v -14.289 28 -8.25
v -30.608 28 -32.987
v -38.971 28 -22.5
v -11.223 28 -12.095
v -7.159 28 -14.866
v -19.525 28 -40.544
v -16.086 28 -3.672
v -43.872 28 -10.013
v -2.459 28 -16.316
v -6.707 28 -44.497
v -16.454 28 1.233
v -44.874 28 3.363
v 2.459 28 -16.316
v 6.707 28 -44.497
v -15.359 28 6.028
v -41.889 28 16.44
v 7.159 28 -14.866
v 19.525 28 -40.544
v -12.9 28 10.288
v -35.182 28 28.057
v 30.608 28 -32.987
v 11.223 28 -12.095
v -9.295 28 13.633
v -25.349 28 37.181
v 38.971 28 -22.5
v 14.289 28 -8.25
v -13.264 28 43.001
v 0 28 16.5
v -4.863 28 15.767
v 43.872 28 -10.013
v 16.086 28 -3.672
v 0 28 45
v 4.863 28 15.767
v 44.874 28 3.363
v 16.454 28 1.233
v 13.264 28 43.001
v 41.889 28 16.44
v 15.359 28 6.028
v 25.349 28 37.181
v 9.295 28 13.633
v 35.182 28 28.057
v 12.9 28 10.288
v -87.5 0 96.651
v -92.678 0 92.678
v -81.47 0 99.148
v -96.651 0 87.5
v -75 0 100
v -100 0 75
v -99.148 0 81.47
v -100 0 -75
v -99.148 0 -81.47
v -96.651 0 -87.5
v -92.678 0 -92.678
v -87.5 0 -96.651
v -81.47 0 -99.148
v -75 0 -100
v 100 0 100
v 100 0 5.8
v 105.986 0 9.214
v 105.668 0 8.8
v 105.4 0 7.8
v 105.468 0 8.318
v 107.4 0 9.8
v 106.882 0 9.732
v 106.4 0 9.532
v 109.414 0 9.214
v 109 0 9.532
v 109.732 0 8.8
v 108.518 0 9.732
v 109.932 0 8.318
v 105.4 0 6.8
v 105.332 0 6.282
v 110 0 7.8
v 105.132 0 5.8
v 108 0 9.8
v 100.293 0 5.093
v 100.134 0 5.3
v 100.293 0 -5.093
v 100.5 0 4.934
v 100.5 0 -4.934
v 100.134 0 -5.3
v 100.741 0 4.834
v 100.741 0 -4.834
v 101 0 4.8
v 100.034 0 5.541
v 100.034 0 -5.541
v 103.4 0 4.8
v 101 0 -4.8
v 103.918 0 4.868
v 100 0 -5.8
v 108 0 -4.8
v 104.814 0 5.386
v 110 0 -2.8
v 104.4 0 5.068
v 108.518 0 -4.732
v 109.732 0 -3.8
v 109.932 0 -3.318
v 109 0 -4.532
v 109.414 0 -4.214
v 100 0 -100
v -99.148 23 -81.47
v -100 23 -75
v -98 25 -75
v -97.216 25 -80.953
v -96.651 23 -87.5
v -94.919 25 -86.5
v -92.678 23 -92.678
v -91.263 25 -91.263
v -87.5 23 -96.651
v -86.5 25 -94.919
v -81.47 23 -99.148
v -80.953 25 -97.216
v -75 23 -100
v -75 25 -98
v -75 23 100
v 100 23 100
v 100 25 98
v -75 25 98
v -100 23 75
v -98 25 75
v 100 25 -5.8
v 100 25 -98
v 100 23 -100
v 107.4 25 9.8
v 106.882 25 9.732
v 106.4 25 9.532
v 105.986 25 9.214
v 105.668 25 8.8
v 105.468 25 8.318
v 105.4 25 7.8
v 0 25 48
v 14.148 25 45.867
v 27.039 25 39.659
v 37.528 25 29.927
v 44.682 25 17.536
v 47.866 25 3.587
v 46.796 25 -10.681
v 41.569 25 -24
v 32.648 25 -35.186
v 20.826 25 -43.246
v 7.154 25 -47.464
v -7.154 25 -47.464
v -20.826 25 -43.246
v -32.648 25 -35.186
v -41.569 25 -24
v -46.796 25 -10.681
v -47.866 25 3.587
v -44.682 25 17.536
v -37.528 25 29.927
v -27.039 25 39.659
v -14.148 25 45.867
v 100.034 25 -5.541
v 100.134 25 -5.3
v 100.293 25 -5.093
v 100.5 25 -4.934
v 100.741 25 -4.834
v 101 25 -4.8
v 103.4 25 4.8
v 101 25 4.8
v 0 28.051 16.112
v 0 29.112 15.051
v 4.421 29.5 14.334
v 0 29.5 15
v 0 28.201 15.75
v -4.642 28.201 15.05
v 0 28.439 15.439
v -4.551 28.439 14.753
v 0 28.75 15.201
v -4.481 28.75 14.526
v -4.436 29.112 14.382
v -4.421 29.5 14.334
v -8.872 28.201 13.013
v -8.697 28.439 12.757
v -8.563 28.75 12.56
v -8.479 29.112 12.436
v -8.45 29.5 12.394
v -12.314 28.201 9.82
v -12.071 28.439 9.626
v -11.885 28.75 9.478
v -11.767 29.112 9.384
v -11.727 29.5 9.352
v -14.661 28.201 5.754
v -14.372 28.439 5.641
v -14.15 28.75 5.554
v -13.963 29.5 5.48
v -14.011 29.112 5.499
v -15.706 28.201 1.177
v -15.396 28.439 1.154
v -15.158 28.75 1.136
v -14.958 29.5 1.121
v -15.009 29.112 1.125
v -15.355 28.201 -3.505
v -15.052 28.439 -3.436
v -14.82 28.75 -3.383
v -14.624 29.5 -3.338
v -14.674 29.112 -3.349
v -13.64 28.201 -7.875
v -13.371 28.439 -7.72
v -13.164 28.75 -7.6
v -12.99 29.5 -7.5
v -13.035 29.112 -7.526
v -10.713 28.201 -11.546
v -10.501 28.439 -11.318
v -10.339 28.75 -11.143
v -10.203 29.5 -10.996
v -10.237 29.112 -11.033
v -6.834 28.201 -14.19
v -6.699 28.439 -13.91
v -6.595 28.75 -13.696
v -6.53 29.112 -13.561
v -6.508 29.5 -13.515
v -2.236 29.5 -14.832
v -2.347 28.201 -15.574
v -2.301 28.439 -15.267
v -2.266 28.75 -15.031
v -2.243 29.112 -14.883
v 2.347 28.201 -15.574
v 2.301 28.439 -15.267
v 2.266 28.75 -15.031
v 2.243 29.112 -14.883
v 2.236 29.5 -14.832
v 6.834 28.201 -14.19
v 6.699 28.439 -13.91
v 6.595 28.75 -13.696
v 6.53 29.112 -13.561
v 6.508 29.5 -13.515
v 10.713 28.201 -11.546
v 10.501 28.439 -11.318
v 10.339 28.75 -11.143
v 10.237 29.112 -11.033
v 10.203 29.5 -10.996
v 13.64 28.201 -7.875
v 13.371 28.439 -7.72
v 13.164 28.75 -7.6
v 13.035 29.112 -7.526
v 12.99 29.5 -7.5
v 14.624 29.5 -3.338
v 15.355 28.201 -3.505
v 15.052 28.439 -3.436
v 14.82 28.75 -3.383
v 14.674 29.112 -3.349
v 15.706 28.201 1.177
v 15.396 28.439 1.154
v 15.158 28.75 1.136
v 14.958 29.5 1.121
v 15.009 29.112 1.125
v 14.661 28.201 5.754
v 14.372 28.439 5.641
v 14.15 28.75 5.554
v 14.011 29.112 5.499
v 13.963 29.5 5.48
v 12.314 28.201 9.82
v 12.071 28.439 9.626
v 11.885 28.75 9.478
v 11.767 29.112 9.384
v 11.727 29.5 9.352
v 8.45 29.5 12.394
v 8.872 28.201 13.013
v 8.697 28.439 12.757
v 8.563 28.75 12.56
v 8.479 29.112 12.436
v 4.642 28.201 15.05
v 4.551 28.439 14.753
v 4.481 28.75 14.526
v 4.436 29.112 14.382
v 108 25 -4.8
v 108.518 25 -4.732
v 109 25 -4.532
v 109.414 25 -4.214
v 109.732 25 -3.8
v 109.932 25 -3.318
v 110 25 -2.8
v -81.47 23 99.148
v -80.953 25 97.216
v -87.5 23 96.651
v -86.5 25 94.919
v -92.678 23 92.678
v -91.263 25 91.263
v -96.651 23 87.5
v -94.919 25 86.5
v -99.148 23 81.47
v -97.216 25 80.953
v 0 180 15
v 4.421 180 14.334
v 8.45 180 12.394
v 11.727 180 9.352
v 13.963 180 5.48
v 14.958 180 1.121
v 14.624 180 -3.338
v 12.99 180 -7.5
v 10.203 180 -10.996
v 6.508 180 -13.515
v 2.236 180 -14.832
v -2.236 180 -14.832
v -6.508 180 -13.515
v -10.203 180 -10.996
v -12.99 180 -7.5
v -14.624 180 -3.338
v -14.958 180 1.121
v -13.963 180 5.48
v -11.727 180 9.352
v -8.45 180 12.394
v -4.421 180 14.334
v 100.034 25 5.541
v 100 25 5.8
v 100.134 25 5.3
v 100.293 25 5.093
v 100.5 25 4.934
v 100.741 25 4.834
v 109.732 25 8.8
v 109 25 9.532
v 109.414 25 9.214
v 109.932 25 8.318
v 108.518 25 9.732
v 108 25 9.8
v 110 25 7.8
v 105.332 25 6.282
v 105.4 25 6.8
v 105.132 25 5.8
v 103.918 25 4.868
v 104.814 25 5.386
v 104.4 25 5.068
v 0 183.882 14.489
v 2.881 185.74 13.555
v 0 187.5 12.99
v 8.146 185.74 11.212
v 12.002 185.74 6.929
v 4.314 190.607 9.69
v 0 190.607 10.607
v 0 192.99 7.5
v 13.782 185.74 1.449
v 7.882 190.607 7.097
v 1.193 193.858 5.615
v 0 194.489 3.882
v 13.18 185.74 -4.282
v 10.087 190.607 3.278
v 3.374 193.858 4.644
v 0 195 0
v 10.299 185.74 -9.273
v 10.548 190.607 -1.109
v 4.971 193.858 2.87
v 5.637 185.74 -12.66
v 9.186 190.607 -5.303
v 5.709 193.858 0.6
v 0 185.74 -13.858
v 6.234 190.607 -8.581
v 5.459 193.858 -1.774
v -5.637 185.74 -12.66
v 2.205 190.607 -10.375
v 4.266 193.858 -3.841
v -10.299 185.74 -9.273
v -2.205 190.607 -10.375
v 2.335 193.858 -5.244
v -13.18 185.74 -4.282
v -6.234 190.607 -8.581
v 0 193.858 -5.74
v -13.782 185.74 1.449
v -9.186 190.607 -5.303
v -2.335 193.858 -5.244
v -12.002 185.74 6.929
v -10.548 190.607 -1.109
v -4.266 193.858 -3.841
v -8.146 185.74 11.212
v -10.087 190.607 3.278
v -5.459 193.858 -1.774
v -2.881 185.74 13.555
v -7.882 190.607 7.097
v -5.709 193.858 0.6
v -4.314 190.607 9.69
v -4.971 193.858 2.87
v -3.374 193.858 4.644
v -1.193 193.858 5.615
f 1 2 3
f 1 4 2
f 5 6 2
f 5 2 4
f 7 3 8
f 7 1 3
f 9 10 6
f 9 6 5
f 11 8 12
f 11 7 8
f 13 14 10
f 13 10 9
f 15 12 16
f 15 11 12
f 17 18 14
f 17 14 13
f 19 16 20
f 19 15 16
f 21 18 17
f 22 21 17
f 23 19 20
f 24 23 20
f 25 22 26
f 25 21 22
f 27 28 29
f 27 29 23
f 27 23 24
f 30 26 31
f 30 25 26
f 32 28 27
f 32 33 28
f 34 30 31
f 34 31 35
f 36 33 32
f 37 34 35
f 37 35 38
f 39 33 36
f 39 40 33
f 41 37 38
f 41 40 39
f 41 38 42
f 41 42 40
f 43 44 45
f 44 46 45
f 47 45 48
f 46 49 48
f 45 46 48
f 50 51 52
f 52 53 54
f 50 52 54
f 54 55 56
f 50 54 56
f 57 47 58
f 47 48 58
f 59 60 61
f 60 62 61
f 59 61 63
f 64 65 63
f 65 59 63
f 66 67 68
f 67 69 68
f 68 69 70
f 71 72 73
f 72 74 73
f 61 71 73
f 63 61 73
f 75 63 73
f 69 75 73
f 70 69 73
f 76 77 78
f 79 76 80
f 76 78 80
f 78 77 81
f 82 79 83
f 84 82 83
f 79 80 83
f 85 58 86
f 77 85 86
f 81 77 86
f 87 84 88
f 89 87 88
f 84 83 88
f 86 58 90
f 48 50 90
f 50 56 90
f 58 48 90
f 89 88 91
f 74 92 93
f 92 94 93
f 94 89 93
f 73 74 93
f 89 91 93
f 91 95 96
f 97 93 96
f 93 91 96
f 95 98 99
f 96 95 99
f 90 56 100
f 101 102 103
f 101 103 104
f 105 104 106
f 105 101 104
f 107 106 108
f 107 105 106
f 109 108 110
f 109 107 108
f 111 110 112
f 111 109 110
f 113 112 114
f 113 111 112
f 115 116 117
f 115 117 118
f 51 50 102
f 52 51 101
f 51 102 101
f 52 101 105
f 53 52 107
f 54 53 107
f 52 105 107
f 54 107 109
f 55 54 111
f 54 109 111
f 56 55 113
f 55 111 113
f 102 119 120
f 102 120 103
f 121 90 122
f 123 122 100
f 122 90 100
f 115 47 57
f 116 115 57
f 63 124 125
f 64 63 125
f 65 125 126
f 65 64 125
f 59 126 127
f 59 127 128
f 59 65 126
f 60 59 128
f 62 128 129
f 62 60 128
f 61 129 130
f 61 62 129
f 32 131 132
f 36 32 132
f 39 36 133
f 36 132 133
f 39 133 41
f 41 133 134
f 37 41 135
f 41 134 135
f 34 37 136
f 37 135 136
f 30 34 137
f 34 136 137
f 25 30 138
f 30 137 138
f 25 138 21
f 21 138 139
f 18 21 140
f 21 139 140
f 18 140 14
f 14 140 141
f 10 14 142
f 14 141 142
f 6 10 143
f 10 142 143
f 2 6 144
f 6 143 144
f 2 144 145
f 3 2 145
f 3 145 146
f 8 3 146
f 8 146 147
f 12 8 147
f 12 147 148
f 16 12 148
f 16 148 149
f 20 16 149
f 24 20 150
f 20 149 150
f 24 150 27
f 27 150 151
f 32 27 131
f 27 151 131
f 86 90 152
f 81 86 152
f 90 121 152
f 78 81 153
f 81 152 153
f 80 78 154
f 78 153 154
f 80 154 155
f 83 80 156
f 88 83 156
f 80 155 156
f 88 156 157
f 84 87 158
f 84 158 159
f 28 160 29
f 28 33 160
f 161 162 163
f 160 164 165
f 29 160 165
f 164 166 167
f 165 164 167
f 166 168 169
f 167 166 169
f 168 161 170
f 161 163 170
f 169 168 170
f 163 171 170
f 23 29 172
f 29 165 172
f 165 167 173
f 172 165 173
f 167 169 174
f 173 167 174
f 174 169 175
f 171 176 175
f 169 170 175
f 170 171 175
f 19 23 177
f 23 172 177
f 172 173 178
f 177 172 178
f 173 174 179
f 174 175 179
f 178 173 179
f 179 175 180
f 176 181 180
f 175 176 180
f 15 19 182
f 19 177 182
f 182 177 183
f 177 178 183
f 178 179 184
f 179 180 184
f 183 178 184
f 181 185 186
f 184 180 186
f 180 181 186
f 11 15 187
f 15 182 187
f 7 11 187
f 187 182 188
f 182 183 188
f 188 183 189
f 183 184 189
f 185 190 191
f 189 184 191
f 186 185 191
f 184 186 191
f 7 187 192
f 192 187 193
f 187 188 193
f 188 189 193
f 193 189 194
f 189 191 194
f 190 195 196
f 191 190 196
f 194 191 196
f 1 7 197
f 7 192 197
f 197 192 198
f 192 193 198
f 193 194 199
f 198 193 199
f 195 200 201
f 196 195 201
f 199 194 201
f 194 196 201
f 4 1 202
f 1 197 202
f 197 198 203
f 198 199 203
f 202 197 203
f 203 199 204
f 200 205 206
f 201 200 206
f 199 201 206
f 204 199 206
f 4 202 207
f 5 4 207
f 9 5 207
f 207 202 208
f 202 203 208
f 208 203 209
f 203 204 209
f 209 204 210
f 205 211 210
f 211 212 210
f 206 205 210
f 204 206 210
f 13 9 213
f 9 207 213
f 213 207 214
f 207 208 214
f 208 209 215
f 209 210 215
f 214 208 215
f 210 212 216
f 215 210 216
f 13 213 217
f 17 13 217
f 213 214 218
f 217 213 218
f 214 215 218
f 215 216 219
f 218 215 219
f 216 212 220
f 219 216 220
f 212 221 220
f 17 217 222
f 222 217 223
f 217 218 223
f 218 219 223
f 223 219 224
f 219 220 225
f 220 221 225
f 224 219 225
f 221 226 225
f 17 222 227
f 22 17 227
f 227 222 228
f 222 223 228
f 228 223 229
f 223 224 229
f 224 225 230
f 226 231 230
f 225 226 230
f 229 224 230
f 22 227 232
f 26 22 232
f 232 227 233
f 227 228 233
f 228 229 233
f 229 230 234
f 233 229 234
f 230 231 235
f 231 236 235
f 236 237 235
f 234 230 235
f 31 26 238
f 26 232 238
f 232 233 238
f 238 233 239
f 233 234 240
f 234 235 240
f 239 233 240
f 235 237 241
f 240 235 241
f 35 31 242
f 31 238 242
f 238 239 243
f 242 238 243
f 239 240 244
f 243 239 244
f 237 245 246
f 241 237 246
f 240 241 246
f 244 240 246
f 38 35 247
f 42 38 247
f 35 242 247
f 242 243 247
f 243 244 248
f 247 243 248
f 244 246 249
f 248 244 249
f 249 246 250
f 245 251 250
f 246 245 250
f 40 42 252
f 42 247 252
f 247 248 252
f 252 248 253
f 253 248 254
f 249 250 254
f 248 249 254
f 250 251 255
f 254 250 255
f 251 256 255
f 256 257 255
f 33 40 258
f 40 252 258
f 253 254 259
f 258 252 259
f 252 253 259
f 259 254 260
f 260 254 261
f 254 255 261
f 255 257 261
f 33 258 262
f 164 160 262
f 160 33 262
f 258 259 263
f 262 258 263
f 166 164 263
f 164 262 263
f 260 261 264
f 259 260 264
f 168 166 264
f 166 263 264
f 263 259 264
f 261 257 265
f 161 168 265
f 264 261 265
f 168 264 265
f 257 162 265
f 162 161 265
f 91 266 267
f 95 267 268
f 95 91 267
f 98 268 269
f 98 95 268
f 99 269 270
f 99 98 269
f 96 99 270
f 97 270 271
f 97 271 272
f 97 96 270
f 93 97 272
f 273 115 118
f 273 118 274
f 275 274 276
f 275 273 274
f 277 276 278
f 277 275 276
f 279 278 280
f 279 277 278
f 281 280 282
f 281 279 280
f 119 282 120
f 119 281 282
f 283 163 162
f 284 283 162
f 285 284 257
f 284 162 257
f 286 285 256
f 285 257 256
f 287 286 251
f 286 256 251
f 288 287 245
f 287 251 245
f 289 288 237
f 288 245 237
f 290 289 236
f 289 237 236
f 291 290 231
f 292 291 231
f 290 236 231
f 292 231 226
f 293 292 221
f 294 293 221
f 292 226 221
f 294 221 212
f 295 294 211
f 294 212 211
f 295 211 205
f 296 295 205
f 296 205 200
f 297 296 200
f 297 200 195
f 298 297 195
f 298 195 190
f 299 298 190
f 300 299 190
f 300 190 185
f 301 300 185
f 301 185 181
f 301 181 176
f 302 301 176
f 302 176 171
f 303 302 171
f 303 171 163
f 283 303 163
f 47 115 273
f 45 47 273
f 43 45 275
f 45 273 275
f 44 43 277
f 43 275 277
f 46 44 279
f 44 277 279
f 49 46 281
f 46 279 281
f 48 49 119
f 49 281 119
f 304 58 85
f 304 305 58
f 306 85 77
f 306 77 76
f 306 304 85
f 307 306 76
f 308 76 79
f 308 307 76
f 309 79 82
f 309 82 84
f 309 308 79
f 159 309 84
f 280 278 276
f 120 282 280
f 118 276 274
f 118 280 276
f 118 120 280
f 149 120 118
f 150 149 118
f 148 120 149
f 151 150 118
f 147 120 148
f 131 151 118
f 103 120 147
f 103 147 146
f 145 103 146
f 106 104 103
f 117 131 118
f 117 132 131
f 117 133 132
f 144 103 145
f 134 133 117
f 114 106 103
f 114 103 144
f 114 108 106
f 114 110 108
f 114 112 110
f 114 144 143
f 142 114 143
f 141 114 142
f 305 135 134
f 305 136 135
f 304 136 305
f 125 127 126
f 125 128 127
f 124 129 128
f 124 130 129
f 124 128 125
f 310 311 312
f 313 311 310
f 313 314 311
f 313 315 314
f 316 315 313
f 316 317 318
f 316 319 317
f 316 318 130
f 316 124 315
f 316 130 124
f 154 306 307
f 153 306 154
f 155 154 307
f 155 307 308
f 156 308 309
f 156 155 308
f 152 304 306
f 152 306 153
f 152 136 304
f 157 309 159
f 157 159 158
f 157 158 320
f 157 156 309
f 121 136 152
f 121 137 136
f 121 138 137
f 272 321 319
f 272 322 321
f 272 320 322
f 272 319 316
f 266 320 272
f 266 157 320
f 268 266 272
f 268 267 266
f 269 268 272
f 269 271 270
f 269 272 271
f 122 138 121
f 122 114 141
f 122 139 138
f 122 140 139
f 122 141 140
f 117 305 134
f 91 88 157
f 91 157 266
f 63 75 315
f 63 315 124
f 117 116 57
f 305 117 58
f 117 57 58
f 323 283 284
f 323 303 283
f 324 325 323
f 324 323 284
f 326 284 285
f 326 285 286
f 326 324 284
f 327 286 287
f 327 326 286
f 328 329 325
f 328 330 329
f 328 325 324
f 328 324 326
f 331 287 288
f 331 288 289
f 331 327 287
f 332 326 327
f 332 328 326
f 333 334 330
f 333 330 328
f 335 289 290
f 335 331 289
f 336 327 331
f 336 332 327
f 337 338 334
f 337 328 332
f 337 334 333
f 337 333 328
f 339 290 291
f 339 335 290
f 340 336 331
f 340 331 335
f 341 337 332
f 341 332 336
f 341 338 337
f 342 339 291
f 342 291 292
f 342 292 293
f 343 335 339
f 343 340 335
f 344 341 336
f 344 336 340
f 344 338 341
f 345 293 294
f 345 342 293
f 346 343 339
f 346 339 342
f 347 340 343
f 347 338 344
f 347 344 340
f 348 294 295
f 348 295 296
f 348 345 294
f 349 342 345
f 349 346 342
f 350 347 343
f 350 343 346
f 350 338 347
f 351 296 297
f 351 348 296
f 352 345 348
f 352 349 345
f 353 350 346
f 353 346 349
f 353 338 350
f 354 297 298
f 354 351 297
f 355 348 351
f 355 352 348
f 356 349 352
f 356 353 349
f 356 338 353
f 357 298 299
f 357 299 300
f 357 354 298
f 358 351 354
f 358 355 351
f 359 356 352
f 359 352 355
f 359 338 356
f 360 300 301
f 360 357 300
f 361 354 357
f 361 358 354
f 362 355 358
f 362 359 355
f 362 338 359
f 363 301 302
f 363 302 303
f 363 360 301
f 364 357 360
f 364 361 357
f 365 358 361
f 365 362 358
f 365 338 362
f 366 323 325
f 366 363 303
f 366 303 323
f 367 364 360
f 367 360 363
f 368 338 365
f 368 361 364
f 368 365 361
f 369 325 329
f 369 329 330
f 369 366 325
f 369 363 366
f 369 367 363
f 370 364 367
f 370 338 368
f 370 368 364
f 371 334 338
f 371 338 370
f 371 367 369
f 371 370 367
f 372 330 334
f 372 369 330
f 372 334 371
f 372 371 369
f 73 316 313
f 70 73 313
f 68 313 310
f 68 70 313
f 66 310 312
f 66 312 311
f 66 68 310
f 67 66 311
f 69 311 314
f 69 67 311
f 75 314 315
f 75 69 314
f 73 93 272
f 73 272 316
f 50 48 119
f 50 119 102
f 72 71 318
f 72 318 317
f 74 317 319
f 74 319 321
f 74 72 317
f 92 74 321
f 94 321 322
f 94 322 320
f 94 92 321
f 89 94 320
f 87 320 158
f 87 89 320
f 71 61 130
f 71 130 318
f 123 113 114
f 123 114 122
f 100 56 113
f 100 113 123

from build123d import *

# Parameters (mm, degrees)
SKETCH1_W           = 200
SKETCH1_H           = 200
BOSS_EXTRUDE1_DEPTH = 25
SKETCH2_R           = 15
BOSS_EXTRUDE2_DEPTH = 170
BOSS_EXTRUDE3_DEPTH = 25
FILLET1_R           = 1
FILLET2_R           = 25
FILLET3_R           = 15
SKETCH5_R           = 45
BOSS_EXTRUDE4_DEPTH = 3
CHAMFER1_SIZE       = 3
FILLET4_R           = 1.5
CHAMFER2_SIZE       = 2


with BuildPart() as part:
    # Sketch1 → Boss-Extrude1 (new body)
    with BuildSketch(Plane(origin=(0, 0, 0), x_dir=(1, 0, 0), z_dir=(0, 1, 0))):
        Rectangle(SKETCH1_W, SKETCH1_H)
    extrude(amount=BOSS_EXTRUDE1_DEPTH)

    # Sketch2 → Boss-Extrude2 (add)
    with BuildSketch(Plane(origin=(0, 25, 0), x_dir=(1, 0, 0), z_dir=(0, 1, 0))):
        with Locations(Location((0, 0, 0), (0, 0, 270))):
            Circle(SKETCH2_R)
    extrude(amount=BOSS_EXTRUDE2_DEPTH)

    # Sketch4 → Boss-Extrude3 (add)
    with BuildSketch(Plane(origin=(0, 0, 0), x_dir=(1, 0, 0), z_dir=(0, 1, 0))):
        with BuildLine():
            Line((100, 4.8), (108, 4.8))
            ThreePointArc((108, 4.8), (109.414213562, 4.214213562), (110, 2.8))
            Line((110, 2.8), (110, -7.8))
            ThreePointArc((110, -7.8), (109.414213562, -9.214213562), (108, -9.8))
            Line((108, -9.8), (107.4, -9.8))
            ThreePointArc((107.4, -9.8), (105.985786438, -9.214213562), (105.4, -7.8))
            Line((105.4, -7.8), (105.4, -6.8))
            ThreePointArc((105.4, -6.8), (104.814213562, -5.385786438), (103.4, -4.8))
            Line((103.4, -4.8), (100, -4.8))
            Line((100, -4.8), (100, 4.8))
        make_face()
    extrude(amount=BOSS_EXTRUDE3_DEPTH)

    # Fillet1
    fillet1_edges = [part.edges().sort_by_distance(p)[0] for p in [
        (100, 12.5, -4.8),
        (100, 12.5, 4.8),
    ]]
    fillet(fillet1_edges, radius=FILLET1_R)

    # Fillet2
    fillet2_edges = [part.edges().sort_by_distance(p)[0] for p in [
        (-100, 12.5, -100),
        (-100, 12.5, 100),
    ]]
    fillet(fillet2_edges, radius=FILLET2_R)

    # Fillet3
    fillet3_edges = [part.edges().sort_by_distance(p)[0] for p in [
        (0, 195, -15),
    ]]
    fillet(fillet3_edges, radius=FILLET3_R)

    # Sketch5 → Boss-Extrude4 (add)
    with BuildSketch(Plane(origin=(0, 25, 0), x_dir=(1, 0, 0), z_dir=(0, 1, 0))):
        with Locations(Location((0, 0, 0), (0, 0, 270))):
            Circle(SKETCH5_R)
    extrude(amount=BOSS_EXTRUDE4_DEPTH)

    # Chamfer1
    chamfer1_edges = [part.edges().sort_by_distance(p)[0] for p in [
        (0, 25, -45),
    ]]
    chamfer(chamfer1_edges, length=CHAMFER1_SIZE - 0.0001)  # a hair under: the kernel refuses the full size

    # Fillet4
    fillet4_edges = [part.edges().sort_by_distance(p)[0] for p in [
        (0, 28, -15),
    ]]
    fillet(fillet4_edges, radius=FILLET4_R)

    # Chamfer2
    chamfer2_edges = [part.edges().sort_by_distance(p)[0] for p in [
        (12.5, 25, -100),
        (-100, 25, 0),
        (12.5, 25, 100),
        (-92.67766953, 25, 92.67766953),
        (-92.67766953, 25, -92.67766953),
    ]]
    chamfer(chamfer2_edges, length=CHAMFER2_SIZE)


solid = part.part
